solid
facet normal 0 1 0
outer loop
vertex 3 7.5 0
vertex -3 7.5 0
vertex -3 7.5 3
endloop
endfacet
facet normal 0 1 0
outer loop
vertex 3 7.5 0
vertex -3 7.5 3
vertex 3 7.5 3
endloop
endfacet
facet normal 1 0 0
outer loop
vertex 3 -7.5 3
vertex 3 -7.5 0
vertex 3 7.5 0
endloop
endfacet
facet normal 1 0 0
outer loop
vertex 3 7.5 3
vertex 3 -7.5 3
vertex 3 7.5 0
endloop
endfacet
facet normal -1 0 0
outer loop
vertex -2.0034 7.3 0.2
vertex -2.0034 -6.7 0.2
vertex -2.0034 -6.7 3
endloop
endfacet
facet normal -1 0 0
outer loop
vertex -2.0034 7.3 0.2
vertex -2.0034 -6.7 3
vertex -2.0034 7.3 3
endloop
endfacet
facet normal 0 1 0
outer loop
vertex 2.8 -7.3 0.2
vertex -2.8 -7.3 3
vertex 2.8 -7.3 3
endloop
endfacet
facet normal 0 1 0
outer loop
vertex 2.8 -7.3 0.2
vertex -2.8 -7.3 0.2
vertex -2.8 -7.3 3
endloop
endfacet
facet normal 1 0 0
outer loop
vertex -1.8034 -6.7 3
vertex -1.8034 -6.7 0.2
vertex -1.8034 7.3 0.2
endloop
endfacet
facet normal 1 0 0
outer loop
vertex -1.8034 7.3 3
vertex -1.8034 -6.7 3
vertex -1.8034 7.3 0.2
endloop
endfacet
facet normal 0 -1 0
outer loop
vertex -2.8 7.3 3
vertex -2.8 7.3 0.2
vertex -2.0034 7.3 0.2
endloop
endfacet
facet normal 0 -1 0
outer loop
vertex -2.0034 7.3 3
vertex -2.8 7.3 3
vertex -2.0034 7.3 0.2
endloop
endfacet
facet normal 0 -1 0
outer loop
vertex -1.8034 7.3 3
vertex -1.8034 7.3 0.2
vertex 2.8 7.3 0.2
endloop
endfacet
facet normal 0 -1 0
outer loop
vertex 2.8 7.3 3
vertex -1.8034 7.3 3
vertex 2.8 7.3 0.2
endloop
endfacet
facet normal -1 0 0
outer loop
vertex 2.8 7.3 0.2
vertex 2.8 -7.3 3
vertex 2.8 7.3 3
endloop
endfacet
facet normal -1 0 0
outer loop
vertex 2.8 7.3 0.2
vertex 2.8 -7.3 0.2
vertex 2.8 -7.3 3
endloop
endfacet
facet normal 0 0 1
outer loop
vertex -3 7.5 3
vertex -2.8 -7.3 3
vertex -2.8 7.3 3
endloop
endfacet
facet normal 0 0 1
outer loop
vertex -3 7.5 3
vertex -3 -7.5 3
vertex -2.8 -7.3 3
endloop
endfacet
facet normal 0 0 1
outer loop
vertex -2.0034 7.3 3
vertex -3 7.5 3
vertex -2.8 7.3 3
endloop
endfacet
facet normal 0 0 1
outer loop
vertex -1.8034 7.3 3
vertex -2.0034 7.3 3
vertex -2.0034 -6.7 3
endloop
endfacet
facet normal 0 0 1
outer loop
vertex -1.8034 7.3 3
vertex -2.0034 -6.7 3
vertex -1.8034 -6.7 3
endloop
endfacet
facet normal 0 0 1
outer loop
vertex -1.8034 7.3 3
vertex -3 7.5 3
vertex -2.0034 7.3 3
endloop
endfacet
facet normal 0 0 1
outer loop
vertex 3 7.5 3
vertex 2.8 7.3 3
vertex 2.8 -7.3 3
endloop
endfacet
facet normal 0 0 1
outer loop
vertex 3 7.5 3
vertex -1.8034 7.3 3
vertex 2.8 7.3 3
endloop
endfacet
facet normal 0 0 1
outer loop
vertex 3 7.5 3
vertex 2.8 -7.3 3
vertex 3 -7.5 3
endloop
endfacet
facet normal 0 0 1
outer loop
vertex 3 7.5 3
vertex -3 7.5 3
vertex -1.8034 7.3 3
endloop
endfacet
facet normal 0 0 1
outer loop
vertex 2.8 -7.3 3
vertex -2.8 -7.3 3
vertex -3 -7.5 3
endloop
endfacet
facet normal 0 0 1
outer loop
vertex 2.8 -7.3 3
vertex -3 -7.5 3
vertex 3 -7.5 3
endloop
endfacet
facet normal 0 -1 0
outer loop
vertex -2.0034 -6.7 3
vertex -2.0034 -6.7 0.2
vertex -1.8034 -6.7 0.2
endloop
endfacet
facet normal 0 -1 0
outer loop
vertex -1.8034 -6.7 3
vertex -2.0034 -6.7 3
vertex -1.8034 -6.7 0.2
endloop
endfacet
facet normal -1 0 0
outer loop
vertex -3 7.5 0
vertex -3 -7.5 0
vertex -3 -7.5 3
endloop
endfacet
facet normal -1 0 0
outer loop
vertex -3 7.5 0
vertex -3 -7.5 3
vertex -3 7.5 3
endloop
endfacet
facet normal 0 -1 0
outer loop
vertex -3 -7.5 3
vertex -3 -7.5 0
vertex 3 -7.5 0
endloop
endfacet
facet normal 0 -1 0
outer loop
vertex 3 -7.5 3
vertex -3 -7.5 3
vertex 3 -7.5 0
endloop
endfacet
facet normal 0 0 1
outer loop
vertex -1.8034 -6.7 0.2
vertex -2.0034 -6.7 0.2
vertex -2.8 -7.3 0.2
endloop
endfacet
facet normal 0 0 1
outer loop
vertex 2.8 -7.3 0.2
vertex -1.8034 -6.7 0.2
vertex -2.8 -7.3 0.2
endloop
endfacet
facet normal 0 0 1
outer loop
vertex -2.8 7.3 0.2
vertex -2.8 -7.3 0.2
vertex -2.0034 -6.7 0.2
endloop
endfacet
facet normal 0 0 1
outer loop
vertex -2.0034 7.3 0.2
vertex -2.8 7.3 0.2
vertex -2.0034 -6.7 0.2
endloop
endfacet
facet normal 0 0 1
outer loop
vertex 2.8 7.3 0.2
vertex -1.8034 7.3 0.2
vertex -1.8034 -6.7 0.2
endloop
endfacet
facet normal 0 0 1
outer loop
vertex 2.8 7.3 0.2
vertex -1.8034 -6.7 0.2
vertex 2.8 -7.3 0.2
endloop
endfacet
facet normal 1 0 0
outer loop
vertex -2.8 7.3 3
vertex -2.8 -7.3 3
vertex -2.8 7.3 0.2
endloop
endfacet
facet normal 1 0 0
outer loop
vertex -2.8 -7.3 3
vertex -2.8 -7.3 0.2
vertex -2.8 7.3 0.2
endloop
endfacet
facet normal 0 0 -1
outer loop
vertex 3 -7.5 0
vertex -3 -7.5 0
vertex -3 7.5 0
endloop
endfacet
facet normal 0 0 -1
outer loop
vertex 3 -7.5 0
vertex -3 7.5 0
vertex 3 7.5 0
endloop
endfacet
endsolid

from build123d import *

# Parameters (mm, degrees)
F0_W     = 6
F0_H     = 15
F1_DEPTH = 3
F2_T     = -0.2
F3_W     = 0.2
F3_H     = 14
F4_DEPTH = 2.8


with BuildPart() as f1:
    # F0 (on Top) → F1 (new body)
    with BuildSketch(Plane.XY):
        Rectangle(F0_W, F0_H)
    extrude(amount=F1_DEPTH)

    # F2
    f2_openings = [f1.faces().sort_by_distance(p)[0] for p in [
        (0, 0, 3),
    ]]
    offset(amount=F2_T, openings=f2_openings)

    # F3 (on face) → F4 (join)
    with BuildSketch(Plane.XY.offset(0.2)):
        with Locations((-1.903401, 0.3)):
            Rectangle(F3_W, F3_H)
    extrude(amount=F4_DEPTH)


solid = f1.part
